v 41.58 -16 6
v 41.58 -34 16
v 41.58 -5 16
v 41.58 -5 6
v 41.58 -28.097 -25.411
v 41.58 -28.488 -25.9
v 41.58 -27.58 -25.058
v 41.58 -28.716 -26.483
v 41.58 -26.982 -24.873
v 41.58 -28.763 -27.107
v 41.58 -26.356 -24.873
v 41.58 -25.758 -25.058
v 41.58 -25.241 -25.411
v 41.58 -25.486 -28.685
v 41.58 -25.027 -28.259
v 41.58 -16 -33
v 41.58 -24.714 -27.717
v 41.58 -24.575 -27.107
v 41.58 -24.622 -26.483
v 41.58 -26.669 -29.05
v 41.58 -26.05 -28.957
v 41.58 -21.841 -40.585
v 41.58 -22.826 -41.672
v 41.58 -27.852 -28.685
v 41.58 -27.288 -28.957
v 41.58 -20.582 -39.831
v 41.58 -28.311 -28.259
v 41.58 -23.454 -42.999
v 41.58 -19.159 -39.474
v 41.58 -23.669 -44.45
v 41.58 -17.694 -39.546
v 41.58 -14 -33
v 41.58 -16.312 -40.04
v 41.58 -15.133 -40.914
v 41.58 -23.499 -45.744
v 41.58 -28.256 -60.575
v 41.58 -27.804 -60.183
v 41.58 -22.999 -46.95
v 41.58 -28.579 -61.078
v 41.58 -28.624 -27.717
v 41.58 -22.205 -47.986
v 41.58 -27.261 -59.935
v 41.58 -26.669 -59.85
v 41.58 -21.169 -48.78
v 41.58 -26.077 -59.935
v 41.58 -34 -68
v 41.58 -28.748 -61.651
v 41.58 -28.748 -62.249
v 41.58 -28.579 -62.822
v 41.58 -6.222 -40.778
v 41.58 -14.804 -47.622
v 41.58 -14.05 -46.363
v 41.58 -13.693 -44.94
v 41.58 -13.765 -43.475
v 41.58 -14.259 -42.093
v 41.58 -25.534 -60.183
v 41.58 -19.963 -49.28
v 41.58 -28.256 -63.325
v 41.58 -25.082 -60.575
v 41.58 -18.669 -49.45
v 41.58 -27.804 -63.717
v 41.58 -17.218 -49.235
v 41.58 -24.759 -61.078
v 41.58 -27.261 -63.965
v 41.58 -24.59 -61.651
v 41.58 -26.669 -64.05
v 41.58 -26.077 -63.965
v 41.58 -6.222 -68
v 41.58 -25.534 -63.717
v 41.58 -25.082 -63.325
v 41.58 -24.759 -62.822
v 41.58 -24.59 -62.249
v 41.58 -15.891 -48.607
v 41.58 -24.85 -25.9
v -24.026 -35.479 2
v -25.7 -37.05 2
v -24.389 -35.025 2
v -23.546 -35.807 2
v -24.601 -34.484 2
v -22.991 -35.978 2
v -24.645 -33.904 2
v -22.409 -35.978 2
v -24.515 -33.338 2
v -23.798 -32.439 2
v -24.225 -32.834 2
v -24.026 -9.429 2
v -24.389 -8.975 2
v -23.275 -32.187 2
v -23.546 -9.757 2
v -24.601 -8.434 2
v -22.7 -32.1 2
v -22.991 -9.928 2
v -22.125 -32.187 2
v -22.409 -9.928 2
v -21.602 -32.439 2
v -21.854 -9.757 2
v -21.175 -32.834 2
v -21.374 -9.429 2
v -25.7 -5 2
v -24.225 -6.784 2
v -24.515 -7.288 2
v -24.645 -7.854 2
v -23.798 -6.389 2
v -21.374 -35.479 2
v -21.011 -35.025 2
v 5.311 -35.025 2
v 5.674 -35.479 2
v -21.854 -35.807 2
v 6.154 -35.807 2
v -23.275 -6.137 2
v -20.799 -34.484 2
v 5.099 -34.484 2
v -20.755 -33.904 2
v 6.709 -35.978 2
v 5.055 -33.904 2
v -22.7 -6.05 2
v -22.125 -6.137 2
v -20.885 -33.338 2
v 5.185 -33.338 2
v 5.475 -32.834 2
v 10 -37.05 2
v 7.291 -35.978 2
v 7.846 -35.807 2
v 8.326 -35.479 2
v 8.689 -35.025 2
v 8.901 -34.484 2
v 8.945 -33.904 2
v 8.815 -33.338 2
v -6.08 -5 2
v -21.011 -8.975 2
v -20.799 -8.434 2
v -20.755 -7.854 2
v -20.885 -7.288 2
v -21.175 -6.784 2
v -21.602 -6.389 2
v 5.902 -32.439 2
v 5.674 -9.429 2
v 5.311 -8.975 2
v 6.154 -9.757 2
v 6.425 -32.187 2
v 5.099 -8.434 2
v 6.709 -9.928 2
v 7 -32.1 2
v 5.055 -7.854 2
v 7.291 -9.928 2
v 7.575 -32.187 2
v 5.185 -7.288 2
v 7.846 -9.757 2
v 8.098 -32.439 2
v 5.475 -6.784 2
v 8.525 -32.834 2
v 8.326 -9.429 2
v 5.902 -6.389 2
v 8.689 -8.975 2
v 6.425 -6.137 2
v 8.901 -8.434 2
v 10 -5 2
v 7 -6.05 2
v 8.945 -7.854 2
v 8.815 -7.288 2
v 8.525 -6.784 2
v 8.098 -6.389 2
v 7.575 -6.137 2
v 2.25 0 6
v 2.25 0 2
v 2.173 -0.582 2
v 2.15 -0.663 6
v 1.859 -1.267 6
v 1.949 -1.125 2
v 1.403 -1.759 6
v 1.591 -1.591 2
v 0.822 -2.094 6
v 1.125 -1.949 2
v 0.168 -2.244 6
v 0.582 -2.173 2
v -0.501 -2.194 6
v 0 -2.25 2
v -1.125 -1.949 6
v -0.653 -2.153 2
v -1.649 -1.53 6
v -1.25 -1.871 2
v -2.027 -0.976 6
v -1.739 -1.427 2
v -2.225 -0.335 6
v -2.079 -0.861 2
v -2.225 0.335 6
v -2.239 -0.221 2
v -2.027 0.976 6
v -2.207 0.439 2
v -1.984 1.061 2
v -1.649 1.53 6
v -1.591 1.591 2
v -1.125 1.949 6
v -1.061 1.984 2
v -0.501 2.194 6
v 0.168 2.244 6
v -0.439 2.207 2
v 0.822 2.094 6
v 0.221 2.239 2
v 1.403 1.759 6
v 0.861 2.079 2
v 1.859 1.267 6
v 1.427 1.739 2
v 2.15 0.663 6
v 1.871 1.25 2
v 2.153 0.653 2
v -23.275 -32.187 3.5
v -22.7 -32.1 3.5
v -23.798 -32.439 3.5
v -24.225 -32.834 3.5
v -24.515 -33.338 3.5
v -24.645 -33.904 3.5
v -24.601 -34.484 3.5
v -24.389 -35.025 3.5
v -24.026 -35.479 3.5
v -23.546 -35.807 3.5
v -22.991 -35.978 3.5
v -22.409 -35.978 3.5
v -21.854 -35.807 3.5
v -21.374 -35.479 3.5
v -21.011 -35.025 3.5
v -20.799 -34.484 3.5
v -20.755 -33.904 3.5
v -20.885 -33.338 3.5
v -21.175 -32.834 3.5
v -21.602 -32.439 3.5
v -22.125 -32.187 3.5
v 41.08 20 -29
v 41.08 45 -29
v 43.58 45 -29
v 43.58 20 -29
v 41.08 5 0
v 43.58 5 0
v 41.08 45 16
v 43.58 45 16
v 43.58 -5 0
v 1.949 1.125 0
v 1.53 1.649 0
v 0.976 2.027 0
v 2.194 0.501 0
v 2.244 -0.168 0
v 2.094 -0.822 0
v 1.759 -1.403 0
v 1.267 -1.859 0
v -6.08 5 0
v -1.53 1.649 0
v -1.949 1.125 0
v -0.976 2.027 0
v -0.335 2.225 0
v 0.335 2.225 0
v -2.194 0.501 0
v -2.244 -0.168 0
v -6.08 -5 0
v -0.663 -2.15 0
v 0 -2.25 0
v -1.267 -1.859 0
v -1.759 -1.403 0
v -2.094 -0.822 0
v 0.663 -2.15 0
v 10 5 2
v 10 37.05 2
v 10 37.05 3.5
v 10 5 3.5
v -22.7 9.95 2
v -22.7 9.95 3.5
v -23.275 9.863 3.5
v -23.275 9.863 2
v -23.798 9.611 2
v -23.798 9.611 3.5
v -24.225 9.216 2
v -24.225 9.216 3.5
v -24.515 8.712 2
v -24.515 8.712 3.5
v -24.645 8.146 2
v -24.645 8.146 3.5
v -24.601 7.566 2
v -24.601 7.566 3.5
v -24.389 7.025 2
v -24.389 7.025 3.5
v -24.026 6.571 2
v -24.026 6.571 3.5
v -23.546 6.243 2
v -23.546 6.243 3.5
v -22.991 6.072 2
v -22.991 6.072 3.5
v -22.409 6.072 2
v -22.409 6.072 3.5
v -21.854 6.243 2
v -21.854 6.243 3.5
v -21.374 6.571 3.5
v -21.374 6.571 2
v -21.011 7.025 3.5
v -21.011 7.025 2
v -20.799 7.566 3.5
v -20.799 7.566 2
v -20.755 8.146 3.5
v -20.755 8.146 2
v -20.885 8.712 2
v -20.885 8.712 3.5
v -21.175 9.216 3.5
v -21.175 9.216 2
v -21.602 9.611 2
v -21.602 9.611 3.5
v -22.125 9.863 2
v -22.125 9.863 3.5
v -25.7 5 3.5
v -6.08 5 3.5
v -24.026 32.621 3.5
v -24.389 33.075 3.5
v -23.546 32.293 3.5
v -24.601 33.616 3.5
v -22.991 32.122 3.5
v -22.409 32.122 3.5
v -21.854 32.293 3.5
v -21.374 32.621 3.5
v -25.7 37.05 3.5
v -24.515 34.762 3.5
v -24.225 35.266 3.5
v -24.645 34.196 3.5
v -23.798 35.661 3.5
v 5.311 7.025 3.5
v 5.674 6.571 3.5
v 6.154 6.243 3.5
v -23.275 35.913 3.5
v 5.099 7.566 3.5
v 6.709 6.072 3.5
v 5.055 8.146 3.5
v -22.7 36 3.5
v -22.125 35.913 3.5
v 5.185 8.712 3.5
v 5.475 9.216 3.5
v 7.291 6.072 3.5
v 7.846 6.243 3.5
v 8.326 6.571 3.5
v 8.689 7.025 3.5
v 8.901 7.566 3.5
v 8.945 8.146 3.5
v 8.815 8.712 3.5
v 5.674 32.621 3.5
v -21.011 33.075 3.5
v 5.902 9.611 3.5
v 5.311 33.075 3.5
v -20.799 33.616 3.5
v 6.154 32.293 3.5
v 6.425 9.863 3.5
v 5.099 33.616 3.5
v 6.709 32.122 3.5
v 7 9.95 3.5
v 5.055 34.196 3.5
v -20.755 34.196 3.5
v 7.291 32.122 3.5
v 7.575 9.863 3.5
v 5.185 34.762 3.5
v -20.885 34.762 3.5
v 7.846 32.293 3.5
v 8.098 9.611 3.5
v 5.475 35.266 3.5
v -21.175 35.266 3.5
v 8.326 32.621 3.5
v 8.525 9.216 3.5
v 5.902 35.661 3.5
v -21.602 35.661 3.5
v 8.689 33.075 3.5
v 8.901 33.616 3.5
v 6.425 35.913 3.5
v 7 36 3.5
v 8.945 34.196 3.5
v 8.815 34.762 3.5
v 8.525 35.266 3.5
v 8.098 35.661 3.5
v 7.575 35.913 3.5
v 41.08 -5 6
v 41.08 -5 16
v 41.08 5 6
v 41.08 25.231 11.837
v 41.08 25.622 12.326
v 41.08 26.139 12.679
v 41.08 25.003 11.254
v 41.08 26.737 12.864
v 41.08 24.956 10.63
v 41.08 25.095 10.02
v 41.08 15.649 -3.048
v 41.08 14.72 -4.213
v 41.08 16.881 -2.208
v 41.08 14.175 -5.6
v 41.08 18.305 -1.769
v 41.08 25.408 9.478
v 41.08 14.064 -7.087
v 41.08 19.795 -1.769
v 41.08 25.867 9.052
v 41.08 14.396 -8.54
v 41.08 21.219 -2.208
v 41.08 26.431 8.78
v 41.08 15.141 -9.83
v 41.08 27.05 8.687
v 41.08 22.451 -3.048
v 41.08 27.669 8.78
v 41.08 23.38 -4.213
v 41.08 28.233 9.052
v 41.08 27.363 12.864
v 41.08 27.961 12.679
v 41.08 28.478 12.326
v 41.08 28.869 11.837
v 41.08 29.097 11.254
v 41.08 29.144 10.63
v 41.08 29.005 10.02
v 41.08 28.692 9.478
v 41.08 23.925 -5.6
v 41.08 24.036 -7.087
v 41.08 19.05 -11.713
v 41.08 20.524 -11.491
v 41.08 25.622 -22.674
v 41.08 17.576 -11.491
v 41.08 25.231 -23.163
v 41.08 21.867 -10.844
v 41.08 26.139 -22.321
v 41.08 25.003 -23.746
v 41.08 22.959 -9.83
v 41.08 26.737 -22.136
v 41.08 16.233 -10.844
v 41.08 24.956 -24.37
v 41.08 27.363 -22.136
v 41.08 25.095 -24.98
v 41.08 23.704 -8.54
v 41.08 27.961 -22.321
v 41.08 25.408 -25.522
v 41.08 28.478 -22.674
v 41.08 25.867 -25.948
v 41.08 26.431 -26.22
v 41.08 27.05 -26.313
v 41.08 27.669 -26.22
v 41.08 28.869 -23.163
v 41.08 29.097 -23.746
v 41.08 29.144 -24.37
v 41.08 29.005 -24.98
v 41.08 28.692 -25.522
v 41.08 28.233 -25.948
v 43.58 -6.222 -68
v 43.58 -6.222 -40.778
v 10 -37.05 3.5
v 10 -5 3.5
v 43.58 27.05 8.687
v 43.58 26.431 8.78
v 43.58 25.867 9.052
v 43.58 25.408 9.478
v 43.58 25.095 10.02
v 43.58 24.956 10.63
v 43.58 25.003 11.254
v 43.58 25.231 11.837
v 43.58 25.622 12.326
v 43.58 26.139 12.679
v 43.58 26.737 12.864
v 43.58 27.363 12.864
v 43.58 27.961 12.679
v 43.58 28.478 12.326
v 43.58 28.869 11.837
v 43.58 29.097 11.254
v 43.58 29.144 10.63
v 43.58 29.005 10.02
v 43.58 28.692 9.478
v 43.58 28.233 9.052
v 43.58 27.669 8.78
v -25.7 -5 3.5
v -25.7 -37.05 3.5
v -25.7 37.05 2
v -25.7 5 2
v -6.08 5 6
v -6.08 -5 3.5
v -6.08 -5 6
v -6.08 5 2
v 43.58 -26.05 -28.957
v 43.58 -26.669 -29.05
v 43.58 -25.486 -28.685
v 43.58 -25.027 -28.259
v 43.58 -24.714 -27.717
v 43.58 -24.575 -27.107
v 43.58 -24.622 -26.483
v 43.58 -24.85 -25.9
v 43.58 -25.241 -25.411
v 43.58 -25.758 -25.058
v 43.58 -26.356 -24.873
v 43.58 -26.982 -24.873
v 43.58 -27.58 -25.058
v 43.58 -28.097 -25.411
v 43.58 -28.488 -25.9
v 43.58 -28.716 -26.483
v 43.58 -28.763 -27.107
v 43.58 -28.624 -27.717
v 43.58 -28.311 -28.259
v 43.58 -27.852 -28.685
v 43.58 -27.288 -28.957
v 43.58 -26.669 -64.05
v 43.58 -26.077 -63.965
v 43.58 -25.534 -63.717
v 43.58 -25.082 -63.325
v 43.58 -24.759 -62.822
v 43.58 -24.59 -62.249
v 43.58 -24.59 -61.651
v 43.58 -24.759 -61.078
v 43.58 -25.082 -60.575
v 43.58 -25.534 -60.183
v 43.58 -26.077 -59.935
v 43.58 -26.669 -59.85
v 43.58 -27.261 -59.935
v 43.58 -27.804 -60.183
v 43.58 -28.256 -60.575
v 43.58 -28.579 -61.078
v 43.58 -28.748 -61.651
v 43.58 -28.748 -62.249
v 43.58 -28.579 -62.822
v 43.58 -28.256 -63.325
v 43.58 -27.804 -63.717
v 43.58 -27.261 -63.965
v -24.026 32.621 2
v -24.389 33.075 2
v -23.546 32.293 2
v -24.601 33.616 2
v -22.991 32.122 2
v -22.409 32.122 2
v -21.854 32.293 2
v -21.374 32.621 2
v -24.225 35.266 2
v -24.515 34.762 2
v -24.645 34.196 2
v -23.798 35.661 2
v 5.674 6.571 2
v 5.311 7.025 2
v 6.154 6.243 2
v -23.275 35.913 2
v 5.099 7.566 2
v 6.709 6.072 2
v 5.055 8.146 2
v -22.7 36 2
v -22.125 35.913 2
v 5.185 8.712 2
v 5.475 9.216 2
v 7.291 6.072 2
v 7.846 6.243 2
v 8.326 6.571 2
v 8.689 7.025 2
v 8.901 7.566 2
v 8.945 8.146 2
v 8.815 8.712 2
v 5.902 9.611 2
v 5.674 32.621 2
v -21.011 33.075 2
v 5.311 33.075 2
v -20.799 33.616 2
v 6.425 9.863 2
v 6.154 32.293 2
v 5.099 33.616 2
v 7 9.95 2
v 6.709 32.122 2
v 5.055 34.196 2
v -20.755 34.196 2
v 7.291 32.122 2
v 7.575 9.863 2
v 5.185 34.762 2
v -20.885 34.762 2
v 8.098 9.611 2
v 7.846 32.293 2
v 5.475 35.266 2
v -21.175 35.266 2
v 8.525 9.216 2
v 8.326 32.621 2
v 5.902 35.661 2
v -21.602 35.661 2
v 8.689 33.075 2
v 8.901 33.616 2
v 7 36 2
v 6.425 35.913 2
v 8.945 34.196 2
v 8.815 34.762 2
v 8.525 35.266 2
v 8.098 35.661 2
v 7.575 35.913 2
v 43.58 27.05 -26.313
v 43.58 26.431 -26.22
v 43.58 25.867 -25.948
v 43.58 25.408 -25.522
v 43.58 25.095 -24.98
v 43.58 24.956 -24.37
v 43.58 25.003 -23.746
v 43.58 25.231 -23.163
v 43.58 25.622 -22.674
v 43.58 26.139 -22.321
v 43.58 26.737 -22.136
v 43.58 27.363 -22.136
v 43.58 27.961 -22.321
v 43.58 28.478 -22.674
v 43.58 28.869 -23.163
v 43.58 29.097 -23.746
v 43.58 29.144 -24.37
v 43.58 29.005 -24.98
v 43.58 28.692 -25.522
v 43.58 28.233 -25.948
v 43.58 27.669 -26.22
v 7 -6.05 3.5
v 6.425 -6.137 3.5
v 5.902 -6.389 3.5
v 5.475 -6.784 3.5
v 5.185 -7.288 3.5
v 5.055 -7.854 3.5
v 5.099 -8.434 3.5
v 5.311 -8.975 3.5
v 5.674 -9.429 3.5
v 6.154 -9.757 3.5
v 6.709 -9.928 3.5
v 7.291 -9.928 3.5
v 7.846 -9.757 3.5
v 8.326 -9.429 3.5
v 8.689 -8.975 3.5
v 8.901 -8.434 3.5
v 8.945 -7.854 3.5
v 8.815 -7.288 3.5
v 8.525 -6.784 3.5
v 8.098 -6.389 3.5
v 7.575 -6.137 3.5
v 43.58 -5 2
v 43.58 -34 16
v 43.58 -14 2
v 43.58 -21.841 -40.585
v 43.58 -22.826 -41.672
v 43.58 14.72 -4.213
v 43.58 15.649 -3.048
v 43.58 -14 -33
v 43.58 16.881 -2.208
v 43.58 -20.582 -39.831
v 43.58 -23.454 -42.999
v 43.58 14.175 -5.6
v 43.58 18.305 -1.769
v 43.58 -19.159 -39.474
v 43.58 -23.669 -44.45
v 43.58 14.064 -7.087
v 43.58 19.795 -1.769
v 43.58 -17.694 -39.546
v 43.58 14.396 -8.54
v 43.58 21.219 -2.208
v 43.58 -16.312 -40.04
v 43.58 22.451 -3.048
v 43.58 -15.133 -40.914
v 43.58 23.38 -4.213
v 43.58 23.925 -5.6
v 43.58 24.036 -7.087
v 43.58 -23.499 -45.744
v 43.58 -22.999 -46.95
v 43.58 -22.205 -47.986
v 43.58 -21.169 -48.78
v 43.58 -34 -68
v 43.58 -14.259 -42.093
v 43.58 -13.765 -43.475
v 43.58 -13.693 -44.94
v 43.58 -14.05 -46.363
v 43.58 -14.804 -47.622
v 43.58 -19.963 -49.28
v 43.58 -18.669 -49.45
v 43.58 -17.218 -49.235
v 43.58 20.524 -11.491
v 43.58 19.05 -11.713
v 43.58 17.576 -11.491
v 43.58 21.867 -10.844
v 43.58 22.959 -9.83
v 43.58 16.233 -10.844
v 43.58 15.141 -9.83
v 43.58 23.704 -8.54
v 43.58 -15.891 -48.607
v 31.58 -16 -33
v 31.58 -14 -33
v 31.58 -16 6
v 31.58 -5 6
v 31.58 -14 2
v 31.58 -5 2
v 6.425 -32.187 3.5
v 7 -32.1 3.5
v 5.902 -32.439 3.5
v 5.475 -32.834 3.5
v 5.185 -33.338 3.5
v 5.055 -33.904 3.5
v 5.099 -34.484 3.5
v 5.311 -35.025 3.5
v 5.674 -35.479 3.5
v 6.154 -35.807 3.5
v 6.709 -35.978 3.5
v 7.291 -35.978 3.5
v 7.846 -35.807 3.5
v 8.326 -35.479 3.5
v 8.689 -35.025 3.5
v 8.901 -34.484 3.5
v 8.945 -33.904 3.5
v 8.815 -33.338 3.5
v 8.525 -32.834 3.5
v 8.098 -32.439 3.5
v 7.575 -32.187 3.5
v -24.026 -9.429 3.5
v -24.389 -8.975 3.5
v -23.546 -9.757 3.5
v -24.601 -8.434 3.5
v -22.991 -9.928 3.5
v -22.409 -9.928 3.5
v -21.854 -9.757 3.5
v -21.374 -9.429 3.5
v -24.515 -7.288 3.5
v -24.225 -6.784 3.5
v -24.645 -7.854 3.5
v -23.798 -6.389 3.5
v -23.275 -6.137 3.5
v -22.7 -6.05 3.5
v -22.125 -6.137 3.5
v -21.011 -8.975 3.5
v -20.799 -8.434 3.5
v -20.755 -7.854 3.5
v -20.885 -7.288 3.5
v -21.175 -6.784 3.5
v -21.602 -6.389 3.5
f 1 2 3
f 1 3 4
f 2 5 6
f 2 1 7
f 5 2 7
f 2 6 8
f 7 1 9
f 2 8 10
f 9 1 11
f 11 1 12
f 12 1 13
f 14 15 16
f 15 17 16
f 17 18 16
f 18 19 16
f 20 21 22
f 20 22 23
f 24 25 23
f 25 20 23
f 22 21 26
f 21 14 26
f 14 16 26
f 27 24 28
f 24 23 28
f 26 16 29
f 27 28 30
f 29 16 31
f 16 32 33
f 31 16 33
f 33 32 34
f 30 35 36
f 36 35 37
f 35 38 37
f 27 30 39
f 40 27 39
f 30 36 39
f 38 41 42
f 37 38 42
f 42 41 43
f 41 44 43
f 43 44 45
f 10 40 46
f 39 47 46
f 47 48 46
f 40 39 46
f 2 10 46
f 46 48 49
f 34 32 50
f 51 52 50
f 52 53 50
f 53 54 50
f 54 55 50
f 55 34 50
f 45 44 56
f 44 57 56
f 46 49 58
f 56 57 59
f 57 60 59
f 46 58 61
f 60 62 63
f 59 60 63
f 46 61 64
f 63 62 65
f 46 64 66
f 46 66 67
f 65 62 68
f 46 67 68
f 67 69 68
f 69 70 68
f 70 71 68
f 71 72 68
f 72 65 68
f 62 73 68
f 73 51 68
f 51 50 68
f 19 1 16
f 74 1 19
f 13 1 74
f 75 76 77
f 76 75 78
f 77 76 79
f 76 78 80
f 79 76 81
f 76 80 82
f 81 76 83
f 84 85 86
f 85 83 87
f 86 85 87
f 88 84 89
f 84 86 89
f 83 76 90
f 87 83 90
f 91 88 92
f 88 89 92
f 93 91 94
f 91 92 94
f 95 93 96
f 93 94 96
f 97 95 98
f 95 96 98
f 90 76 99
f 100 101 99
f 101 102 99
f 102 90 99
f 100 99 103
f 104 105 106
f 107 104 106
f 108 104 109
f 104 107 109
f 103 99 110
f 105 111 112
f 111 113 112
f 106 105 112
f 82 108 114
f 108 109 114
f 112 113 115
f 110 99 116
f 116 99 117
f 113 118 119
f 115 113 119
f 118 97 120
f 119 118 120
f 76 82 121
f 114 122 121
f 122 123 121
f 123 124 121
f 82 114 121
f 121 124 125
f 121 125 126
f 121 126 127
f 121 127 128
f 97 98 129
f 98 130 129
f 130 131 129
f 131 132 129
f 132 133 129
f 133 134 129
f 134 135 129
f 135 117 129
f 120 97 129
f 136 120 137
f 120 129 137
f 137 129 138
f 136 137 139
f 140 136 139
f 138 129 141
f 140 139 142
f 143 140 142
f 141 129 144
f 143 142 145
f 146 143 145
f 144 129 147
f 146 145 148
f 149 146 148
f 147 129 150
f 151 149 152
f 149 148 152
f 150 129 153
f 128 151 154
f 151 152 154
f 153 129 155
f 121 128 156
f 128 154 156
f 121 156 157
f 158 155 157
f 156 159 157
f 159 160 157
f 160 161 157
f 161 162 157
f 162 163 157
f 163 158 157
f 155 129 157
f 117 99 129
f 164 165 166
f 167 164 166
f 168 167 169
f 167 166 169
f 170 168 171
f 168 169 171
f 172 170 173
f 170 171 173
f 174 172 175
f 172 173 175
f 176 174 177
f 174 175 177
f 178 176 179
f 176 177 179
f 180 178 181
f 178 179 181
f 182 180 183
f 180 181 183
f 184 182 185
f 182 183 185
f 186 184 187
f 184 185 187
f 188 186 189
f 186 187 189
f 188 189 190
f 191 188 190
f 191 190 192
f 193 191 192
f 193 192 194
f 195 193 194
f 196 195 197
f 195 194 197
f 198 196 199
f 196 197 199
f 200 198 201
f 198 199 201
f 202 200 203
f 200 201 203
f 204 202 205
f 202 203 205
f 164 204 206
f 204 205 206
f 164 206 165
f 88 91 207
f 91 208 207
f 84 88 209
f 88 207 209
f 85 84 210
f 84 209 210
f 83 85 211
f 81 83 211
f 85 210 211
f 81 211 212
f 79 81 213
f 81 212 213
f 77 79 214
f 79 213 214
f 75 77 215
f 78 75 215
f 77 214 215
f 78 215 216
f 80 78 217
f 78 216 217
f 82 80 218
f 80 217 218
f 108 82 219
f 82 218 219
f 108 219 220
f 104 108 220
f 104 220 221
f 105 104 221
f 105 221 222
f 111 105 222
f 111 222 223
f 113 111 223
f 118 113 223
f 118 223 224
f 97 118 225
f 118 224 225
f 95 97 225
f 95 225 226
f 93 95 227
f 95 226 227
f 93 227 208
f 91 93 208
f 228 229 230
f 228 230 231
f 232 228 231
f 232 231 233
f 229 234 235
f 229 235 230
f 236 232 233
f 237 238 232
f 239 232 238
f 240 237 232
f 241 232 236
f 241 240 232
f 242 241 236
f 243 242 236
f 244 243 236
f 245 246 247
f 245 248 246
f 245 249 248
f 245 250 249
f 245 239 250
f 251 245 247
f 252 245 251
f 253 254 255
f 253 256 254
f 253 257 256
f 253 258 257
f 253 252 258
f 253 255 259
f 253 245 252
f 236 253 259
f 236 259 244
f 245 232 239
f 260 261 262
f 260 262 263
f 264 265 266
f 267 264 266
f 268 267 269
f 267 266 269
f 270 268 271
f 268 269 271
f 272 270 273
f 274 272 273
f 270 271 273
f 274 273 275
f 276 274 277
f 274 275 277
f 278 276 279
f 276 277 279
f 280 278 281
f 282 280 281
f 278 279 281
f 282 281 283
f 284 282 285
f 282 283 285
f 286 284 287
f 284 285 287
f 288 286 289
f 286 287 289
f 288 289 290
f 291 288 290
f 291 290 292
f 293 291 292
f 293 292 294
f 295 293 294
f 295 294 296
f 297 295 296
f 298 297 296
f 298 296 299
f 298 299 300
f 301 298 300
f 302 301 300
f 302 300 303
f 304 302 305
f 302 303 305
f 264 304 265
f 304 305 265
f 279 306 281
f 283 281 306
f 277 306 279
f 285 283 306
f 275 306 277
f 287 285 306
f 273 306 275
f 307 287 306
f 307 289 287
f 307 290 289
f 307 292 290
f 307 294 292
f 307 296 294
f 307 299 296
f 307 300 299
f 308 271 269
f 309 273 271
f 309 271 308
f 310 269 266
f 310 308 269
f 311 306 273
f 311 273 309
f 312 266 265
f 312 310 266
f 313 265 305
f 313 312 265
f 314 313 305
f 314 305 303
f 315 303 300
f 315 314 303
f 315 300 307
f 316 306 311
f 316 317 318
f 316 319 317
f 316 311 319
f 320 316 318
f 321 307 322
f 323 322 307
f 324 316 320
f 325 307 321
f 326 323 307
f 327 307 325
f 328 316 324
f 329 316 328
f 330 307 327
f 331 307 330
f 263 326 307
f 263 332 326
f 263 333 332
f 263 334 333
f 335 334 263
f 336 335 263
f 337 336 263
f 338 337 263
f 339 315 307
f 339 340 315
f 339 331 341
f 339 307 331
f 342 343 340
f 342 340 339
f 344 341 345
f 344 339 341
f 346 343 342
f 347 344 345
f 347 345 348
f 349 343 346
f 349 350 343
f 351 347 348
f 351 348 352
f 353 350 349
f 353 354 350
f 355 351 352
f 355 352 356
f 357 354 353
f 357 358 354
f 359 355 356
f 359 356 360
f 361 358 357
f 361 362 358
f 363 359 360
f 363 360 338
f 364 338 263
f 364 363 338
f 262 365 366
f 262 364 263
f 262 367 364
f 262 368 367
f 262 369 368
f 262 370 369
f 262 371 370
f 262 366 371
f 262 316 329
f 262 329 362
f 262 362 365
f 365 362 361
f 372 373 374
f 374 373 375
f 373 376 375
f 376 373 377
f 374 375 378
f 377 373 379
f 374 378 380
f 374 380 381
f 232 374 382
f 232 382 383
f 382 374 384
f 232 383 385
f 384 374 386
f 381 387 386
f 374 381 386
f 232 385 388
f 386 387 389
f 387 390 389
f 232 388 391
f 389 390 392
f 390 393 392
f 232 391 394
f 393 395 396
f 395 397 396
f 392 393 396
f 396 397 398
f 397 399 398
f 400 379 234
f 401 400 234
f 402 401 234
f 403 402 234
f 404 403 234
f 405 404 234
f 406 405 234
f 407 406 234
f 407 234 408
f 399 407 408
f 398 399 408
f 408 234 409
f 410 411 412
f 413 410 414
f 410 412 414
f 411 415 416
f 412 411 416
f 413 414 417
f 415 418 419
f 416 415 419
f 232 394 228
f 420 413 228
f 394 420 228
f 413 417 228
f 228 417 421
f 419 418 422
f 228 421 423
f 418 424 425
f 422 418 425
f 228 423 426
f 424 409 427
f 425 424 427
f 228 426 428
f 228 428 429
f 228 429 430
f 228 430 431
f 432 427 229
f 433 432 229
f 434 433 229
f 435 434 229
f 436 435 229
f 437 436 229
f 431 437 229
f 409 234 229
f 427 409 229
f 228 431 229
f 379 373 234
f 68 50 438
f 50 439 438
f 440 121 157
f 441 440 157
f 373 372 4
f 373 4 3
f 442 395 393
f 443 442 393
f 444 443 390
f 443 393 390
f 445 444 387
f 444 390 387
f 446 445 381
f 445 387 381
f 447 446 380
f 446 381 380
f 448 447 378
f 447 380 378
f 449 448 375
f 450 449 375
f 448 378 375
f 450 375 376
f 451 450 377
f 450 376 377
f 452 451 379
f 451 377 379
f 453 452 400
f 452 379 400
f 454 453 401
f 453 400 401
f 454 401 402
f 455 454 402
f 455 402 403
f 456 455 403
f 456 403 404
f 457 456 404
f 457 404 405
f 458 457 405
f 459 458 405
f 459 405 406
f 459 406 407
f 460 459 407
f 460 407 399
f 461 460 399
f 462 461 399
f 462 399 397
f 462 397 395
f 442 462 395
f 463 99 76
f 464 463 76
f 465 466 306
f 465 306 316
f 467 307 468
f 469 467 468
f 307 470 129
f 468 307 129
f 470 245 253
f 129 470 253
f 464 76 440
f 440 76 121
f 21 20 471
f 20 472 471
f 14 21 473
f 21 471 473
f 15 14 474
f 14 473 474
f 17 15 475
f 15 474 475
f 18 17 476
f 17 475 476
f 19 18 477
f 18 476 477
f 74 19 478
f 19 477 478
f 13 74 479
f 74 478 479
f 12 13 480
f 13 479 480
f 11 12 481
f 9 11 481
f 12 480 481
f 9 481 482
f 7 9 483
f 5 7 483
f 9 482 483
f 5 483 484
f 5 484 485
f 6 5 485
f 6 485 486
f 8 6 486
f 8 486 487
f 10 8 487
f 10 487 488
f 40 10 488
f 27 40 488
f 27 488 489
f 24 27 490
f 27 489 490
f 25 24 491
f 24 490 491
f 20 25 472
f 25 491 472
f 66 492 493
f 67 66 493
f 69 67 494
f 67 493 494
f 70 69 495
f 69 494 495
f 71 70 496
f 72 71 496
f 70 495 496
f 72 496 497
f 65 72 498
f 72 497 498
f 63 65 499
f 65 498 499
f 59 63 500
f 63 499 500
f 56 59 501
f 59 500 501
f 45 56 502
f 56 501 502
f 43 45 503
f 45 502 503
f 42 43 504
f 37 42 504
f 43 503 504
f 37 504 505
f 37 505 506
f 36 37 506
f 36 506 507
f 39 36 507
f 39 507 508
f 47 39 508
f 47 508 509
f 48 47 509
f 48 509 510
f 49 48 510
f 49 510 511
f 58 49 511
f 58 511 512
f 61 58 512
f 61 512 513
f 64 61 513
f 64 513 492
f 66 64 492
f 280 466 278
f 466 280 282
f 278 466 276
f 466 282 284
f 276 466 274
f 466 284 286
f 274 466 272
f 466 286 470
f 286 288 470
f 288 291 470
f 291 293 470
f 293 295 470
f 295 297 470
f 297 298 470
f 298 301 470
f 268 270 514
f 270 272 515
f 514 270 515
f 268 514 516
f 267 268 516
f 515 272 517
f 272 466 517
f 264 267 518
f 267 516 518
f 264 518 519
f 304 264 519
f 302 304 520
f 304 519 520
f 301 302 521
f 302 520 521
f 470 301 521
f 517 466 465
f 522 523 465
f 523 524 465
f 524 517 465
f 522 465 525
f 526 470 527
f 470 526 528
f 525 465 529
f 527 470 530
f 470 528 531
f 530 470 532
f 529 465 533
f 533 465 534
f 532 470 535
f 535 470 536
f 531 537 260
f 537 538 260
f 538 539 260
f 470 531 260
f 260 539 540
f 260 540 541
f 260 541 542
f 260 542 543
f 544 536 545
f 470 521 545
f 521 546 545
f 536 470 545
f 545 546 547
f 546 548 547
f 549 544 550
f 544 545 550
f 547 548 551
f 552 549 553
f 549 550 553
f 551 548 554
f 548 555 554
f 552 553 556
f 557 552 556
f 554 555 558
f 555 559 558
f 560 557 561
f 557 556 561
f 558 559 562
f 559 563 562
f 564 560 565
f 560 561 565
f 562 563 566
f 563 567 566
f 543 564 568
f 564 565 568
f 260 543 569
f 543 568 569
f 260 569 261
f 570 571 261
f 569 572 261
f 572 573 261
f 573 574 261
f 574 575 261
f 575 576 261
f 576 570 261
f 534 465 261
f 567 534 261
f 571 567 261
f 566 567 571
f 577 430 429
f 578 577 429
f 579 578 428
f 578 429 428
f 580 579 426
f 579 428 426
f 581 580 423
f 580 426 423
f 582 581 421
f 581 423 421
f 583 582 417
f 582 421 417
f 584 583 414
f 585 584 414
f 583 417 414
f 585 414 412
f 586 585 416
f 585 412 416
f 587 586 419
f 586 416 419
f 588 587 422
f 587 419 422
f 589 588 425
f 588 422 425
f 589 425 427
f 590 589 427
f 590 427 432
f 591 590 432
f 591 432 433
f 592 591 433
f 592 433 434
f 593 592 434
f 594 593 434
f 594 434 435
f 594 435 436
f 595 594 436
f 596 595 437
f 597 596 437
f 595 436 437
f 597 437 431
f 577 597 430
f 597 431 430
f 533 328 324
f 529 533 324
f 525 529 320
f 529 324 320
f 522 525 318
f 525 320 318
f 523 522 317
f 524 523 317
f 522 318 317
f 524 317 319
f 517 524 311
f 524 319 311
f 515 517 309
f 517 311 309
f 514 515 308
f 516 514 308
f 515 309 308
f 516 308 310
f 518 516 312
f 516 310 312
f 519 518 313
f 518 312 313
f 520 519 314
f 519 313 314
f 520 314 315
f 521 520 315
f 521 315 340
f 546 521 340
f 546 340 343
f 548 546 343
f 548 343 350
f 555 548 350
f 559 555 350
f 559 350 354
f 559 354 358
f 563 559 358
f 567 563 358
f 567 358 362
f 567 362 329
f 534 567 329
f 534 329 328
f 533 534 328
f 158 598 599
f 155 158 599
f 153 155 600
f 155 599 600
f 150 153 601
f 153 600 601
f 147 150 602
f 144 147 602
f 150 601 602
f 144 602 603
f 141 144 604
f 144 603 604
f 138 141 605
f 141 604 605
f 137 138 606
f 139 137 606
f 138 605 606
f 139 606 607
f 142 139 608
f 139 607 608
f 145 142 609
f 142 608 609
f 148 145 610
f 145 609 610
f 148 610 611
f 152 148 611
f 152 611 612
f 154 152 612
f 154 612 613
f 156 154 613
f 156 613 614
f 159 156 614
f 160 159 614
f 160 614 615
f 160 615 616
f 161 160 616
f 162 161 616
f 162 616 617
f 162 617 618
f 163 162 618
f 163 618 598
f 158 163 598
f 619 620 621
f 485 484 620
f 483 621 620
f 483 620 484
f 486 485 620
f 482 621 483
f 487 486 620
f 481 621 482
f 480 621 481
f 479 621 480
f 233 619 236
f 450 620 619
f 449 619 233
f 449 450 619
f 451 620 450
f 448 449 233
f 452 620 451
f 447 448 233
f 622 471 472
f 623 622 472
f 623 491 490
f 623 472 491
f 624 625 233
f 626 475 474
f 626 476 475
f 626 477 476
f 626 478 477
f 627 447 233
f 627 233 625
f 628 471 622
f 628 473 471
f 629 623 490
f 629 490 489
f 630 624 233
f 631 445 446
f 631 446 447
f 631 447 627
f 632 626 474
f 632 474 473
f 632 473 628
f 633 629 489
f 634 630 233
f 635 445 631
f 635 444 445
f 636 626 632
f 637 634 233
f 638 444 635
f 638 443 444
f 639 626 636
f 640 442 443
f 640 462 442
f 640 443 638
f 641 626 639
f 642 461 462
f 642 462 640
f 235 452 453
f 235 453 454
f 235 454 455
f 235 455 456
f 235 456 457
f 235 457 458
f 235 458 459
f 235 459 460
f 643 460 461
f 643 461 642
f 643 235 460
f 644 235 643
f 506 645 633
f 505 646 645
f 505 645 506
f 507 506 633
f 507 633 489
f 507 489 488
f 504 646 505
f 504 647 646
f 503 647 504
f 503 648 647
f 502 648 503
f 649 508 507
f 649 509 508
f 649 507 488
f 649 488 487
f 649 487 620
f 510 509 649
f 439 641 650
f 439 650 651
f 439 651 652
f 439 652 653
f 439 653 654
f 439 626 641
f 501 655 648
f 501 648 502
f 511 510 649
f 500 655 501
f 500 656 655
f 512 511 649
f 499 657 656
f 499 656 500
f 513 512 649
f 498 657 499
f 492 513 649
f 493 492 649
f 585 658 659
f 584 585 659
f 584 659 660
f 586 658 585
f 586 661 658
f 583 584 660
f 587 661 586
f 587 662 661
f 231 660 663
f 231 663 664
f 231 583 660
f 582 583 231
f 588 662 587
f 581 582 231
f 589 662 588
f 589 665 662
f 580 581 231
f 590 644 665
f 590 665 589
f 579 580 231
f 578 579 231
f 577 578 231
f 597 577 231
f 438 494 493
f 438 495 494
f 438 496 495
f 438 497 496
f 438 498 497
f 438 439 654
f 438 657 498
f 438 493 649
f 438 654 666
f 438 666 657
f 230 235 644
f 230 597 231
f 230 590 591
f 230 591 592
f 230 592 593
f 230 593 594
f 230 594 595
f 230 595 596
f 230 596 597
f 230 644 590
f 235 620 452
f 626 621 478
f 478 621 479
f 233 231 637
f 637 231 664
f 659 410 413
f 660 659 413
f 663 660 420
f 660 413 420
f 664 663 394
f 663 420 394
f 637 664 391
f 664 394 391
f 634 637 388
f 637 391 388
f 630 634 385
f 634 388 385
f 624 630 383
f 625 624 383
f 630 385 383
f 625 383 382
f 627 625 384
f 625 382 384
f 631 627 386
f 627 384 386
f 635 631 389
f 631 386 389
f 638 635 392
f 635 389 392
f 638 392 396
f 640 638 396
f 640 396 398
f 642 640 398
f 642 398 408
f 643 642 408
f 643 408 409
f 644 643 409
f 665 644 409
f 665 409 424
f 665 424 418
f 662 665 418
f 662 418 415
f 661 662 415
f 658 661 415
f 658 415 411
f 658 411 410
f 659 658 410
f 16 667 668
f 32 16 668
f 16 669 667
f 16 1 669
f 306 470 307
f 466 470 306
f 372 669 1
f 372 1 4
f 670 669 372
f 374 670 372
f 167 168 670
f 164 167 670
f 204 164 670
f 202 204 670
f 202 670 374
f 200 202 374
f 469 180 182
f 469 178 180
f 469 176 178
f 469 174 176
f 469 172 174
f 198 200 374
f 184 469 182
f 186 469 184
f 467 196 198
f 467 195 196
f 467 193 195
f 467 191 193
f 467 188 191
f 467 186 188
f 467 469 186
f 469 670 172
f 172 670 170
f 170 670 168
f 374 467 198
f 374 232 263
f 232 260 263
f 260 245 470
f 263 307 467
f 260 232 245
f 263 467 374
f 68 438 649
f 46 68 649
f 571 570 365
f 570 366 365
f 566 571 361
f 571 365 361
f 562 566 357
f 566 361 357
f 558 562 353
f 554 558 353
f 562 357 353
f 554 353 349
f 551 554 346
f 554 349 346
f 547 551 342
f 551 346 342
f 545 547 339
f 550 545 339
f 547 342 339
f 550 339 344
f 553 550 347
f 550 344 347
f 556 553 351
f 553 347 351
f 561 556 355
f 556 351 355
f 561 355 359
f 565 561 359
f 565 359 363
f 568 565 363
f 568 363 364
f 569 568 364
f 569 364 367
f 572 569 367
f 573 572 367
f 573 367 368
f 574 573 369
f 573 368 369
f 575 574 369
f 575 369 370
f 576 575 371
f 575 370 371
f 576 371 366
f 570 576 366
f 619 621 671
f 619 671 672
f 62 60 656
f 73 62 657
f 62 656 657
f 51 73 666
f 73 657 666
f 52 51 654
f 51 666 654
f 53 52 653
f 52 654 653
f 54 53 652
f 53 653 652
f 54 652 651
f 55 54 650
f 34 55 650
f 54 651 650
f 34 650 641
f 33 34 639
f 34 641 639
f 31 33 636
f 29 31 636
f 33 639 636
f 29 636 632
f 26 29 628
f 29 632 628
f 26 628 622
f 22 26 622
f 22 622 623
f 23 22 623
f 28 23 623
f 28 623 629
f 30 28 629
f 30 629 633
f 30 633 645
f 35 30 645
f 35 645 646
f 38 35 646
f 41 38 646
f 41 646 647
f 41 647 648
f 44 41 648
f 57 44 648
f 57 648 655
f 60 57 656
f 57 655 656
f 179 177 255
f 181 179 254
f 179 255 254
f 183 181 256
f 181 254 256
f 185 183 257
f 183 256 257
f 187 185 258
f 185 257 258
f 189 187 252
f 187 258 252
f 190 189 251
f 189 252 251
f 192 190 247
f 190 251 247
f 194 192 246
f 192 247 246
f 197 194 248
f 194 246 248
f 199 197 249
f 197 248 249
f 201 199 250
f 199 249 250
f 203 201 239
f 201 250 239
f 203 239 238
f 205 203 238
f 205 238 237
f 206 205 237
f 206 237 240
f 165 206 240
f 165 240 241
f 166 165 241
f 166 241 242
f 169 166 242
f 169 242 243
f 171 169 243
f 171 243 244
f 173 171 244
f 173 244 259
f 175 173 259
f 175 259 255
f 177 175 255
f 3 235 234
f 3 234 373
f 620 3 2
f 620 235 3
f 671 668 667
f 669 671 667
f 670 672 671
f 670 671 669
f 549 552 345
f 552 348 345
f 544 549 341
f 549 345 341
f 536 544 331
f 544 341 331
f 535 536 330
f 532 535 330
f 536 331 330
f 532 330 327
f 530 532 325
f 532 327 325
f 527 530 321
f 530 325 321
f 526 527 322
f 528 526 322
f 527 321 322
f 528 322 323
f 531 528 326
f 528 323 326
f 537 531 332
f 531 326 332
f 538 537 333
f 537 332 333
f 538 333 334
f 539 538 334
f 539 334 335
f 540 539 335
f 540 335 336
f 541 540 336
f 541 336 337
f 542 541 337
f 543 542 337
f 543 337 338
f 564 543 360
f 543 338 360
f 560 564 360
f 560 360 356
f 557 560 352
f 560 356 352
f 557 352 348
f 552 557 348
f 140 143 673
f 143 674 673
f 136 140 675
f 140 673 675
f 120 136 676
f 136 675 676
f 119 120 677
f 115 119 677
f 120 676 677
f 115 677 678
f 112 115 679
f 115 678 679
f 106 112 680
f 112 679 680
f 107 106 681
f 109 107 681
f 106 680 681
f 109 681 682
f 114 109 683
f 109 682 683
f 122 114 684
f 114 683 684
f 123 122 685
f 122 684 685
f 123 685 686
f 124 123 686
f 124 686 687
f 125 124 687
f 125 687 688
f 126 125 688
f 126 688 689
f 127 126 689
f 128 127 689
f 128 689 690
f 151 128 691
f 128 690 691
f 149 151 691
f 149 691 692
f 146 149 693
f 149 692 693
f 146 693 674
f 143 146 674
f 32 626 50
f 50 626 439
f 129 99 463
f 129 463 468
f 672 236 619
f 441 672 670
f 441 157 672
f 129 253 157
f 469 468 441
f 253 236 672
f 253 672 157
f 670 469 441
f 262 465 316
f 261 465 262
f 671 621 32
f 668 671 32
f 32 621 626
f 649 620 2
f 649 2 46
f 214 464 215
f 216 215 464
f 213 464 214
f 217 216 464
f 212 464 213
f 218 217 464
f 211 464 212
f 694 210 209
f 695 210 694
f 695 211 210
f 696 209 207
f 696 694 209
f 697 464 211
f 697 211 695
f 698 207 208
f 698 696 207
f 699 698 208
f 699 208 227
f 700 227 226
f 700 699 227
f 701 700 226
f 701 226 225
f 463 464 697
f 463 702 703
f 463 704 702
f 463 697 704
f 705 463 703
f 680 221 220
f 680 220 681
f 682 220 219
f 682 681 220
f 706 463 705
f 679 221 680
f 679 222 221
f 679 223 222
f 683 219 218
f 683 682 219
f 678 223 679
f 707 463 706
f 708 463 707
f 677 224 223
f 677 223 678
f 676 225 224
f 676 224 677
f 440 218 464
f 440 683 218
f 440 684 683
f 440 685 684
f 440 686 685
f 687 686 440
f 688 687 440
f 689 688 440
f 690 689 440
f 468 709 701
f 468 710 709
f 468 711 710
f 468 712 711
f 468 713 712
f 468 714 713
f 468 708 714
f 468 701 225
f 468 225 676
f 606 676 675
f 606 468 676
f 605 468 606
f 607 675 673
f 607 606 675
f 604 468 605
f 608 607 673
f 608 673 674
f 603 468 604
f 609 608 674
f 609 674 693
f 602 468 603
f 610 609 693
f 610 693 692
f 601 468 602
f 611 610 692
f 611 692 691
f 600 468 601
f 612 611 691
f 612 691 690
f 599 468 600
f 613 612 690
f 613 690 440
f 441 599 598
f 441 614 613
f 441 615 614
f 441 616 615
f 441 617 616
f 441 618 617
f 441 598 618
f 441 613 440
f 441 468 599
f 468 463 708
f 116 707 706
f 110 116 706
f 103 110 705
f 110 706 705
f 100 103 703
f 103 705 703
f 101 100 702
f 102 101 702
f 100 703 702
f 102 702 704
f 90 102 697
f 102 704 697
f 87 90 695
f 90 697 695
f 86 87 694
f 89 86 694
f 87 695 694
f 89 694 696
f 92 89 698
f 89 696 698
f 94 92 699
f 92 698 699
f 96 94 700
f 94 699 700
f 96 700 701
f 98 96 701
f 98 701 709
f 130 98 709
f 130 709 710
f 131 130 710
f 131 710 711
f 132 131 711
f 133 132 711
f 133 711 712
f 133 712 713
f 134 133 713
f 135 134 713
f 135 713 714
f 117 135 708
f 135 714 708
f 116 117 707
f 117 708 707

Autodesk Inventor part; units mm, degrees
ref_plane "YZ Plane" through (0, 0, 0) normal (1, 0, 0) x (0, 1, 0)
ref_plane "XZ Plane" through (0, 0, 0) normal (0, 1, 0) x (-1, 0, 0)
ref_plane "XY Plane" through (0, 0, 0) normal (0, 0, 1) x (1, 0, 0)
sketch "Sketch14" plane through (0, 0, 0) normal (0, 0, 1) x (1, 0, 0)
  line L0 (0, 0) -> (-6.08, 0)
  line L1 (-6.08, 0) -> (0, 0)
  line L2 (0, 0) -> (6.08, 0)
  line L3 (-6.08, 0) -> (-6.08, 5)
  line L4 (-6.08, 0) -> (-1.08, 0) construction
  line L5 (-6.08, 5) -> (6.08, 5)
  line L6 (6.08, 5) -> (6.08, -5)
  line L7 (6.08, -5) -> (-6.08, -5)
  line L8 (-6.08, -5) -> (-6.08, 5)
  dimension "d66" = 6.08
  dimension "d67" = 6.08
  dimension "d68" = 5
  dimension "d69" = 90
  dimension "d70" = 12.16
  dimension "d71" = 10
extrude "Extrusion7" add sketch "Sketch14" along normal blind 2
sketch "Sketch15" plane through (0, 0, 2) normal (0, 0, 1) x (1, 0, 0)
  circle A0 centre (0, 0) radius 1.0665
hole "Hole4" at (0, 0, 2) direction (0, 0, -1) diameter 4.5 end through all clearance for "Flat Head Machine Screw" size "M4" standard "Ansi Metric M Profile"
sketch "Sketch16" plane through (0, 0, 2) normal (0, 0, 1) x (1, 0, 0)
  line L0 (6.08, 5) -> (-6.08, 5) projected
  line L1 (0, 5) -> (10, 5)
  line L2 (10, 5) -> (-25.7, 5)
  line L3 (-25.7, 5) -> (-25.7, 37.05)
  line L4 (-25.7, 37.05) -> (10, 37.05)
  line L5 (10, 37.05) -> (10, 5)
  line L6 (-6.08, -5) -> (6.08, -5) projected
  line L7 (0, -5) -> (10, -5)
  line L8 (10, -5) -> (-25.7, -5)
  line L9 (-25.7, -5) -> (-25.7, -37.05)
  line L10 (-25.7, -37.05) -> (10, -37.05)
  line L11 (10, -37.05) -> (10, -5)
  line L12 (-25.7, 37.05) -> (-22.7, 37.05)
  line L13 (-22.7, 37.05) -> (-22.7, 34.05)
  line L14 (-22.7, 34.05) -> (-25.7, 34.05)
  line L15 (-25.7, 34.05) -> (-25.7, 37.05)
  line L16 (-22.7, 34.05) -> (7, 34.05)
  line L17 (7, 34.05) -> (7, 8)
  line L18 (7, 8) -> (-22.7, 8)
  line L19 (-22.7, 8) -> (-22.7, 34.05)
  line L20 (-25.7, -37.05) -> (-22.7, -37.05)
  line L21 (-22.7, -37.05) -> (-22.7, -34.05)
  line L22 (-22.7, -34.05) -> (-25.7, -34.05)
  line L23 (-25.7, -34.05) -> (-25.7, -37.05)
  line L24 (-22.7, -34.05) -> (7, -34.05)
  line L25 (7, -34.05) -> (7, -8)
  line L26 (7, -8) -> (-22.7, -8)
  line L27 (-22.7, -8) -> (-22.7, -34.05)
  line L28 (-25.7, -5) -> (10, -5)
  line L29 (10, -5) -> (10, -37.05)
  line L30 (10, -37.05) -> (-25.7, -37.05)
  line L31 (-25.7, -37.05) -> (-25.7, -5)
  point P0 (0, 0)
  dimension "d81" = 10
  dimension "d82" = 35.7
  dimension "d83" = 32.05
  dimension "d84" = 35.7
  dimension "d85" = 32.05
  dimension "d86" = 3
  dimension "d87" = 3
  dimension "d88" = 29.7
  dimension "d89" = 26.05
  dimension "d90" = 3
  dimension "d91" = 3
  dimension "d92" = 29.7
  dimension "d93" = 26.05
  dimension "d172" = 10
extrude "Extrusion8" add sketch "Sketch16" along normal blind 1.5 contours L16 L17 L18 L19 | L0 L2 L3 L14 L13 L4 L5 L1 | L13 L14 L3 L4 | L27 L26 L25 L24 | L6 L7 L11 L10 L21 L22 L9 L8 | L22 L21 L10 L9
hole "Hole5" at (-22.7, 34.05, 2) at (-22.7, 8, 2) at (7, 8, 2) at (7, 34.05, 2) at (7, -8, 2) at (7, -34.05, 2) at (-22.7, -34.05, 2) at (-22.7, -8, 2) direction (0, 0, 1) diameter 3.9 end through all clearance for "Flat Head Machine Screw" size "M3.5" standard "Ansi Metric M Profile"
sketch "Sketch17" plane through (0, 0, 2) normal (0, 0, 1) x (1, 0, 0)
  circle A0 centre (0, 0) radius 2.25 projected
  line L0 (6.08, -5) -> (6.08, 5) projected
  line L1 (6.08, 5) -> (-6.08, 5) projected
  line L2 (-6.08, 5) -> (-6.08, -5) projected
  line L3 (-6.08, -5) -> (6.08, -5) projected
extrude "Extrusion9" add sketch "Sketch17" along normal blind 4
sketch "Sketch18" plane through (6.08, -5, 0) normal (1, 0, 0) x (0, 0, -1)
  line L0 (0, 0) -> (0, 10) projected
  line L1 (0, 10) -> (-2, 10) projected
  line L2 (-3.5, 10) -> (-2, 10) projected
  line L3 (-3.5, 10) -> (-6, 10) projected
  line L4 (-6, 0) -> (-6, 10) projected
  line L5 (-3.5, 0) -> (-6, 0) projected
  line L6 (-2, 0) -> (-3.5, 0) projected
  line L7 (0, 0) -> (-2, 0) projected
  point P0 (0, 5)
extrude "Extrusion10" add sketch "Sketch18" along normal blind 35
sketch "Sketch19" plane through (41.08, -5, 0) normal (1, 0, 0) x (0, 0, -1)
  line L0 (-6, 10) -> (-6, 0) projected
  line L1 (-6, 0) -> (-16, 0)
  line L2 (-16, 0) -> (-16, 50)
  line L3 (-16, 50) -> (29, 50)
  line L4 (29, 50) -> (29, 25)
  line L5 (29, 25) -> (0, 10)
  line L6 (0, 10) -> (0, 0) projected
  line L7 (0, 10) -> (0, 0)
  line L8 (0, 0) -> (-6, 0)
  point P0 (0, 5)
  dimension "d107" = 10
  dimension "d108" = 50
  dimension "d109" = 90
  dimension "d110" = 45
  dimension "d111" = 90
  dimension "d112" = 25
extrude "Extrusion11" add sketch "Sketch19" along normal blind 2.5
sketch "Sketch21" plane through (43.58, -5, 0) normal (1, 0, 0) x (0, 0, -1)
  line L0 (-3.5, 10) -> (-6, 10) projected
  line L1 (0, 10) -> (0, 24.05)
  line L2 (0, 10) -> (14.05, 10) construction
  line L3 (0, 24.05) -> (6.713, 24.05)
  point P0 (0, 5)
  point P1 (3, 10)
  point P2 (-2, 10)
  dimension "d118" = 14.05
  dimension "d119" = 90
  dimension "d120" = 6.713
  dimension "d121" = 90
hole "Hole6" at (43.58, 19.05, -6.713) direction (-1, 0, 0) diameter 10 end through all
sketch "Sketch22" plane through (43.58, -5, 0) normal (1, 0, 0) x (0, 0, -1)
  circle A0 centre (6.713, 24.05) radius 5 projected
  line L0 (6.713, 24.05) -> (6.713, 32.05)
  line L1 (6.713, 24.05) -> (14.713, 24.05) construction
  line L2 (6.713, 32.05) -> (24.213, 32.05)
  line L3 (24.213, 32.05) -> (-10.787, 32.05)
  point P0 (0, 5)
  dimension "d129" = 8
  dimension "d130" = 90
  dimension "d131" = 17.5
  dimension "d132" = 90
  dimension "d133" = 35
hole "Hole7" at (43.58, 27.05, 10.787) at (43.58, 27.05, -24.213) direction (-1, 0, 0) diameter 4.2 end through all
sketch "Sketch23" plane through (43.58, -5, 0) normal (1, 0, 0) x (0, 0, -1)
  line L0 (-3.5, 0) -> (-2, 0) projected
  line L1 (-2, 0) -> (-2, -9)
  line L2 (-2, 0) -> (7, 0) construction
  line L3 (-2, -9) -> (33, -9) construction
  line L4 (-2, -9) -> (33, -9)
  line L5 (-2, -9) -> (33, -9) construction
  line L6 (33, -9) -> (40.7782, -1.2218)
  line L7 (40.7782, -1.2218) -> (60.7782, -1.2218)
  line L8 (33, -9) -> (68, -9)
  line L9 (33, -9) -> (68, -9) construction
  line L10 (68, -9) -> (68, -1.2218)
  line L11 (68, -1.2218) -> (60.7782, -1.2218)
  line L12 (68, -9) -> (68, -29)
  line L13 (68, -9) -> (88, -9) construction
  line L14 (68, -29) -> (-2, -29)
  line L15 (-2, -29) -> (-2, -9)
  line L16 (33, -9) -> (44.45, -9)
  line L17 (44.45, -9) -> (44.45, -13.669)
  line L18 (44.45, -9) -> (49.119, -9) construction
  line L19 (44.45, -13.669) -> (44.45, -21.669)
  line L20 (44.45, -21.669) -> (61.95, -21.669)
  line L21 (61.95, -21.669) -> (26.95, -21.669)
  circle A0 centre (26.95, -21.669) radius 2.1
  circle A1 centre (61.95, -21.669) radius 2.1
  circle A2 centre (44.45, -13.669) radius 5
  point P0 (0, 5)
  dimension "d141" = 9
  dimension "d142" = 90
  dimension "d145" = 35
  dimension "d146" = 0
  dimension "d147" = 11
  dimension "d148" = 135
  dimension "d149" = 20
  dimension "d150" = 35
  dimension "d151" = 0
  dimension "d152" = 20
  dimension "d153" = 90
  dimension "d154" = 90
  dimension "d155" = 11.45
  dimension "d156" = 4.669
  dimension "d157" = 90
  dimension "d158" = 8
  dimension "d159" = 17.5
  dimension "d160" = 35
  dimension "d161" = 4.2
  dimension "d162" = 4.2
  dimension "d163" = 10
extrude "Extrusion13" add sketch "Sketch23" against normal blind 2 contours L4 L8 A2 L12 L14 L15 | L6 L7 L11 L10 L8 A2
sketch "Sketch24" plane through (43.58, -5, 0) normal (1, 0, 0) x (0, 0, -1)
  line L0 (-16, 50) -> (-16, 0) projected
  line L1 (-16, 0) -> (-16, -29)
  line L2 (68, -29) -> (-2, -29) projected
  line L3 (-16, -29) -> (-2, -29)
  line L4 (0, 0) -> (-2, 0) projected
  line L5 (-2, -29) -> (-2, 0)
  line L6 (-16, 0) -> (0, 0) projected
  line L7 (-2, 0) -> (-16, 0)
  point P0 (0, 5)
  point P1 (3, 0)
extrude "Extrusion14" add sketch "Sketch24" against normal blind 2
sketch "Sketch25" plane through (41.58, -5, 0) normal (-1, 0, 0) x (0, 0, 1)
  line L0 (2, -9) -> (-33, -9) projected
  line L1 (-33, -9) -> (2, -9)
  line L2 (2, -9) -> (2, -11)
  line L3 (2, -11) -> (-33, -11)
  line L4 (-33, -11) -> (-33, -9)
  line L5 (2, -11) -> (6, -11)
  line L6 (6, -11) -> (6, 0)
  line L7 (6, 0) -> (2, 0)
  line L8 (2, 0) -> (2, -11)
  point P0 (0, 5)
  point P1 (2, -9)
  dimension "d168" = 35
  dimension "d169" = 2
extrude "Extrusion15" add sketch "Sketch25" along normal blind 10
properties part number "Shelf"
